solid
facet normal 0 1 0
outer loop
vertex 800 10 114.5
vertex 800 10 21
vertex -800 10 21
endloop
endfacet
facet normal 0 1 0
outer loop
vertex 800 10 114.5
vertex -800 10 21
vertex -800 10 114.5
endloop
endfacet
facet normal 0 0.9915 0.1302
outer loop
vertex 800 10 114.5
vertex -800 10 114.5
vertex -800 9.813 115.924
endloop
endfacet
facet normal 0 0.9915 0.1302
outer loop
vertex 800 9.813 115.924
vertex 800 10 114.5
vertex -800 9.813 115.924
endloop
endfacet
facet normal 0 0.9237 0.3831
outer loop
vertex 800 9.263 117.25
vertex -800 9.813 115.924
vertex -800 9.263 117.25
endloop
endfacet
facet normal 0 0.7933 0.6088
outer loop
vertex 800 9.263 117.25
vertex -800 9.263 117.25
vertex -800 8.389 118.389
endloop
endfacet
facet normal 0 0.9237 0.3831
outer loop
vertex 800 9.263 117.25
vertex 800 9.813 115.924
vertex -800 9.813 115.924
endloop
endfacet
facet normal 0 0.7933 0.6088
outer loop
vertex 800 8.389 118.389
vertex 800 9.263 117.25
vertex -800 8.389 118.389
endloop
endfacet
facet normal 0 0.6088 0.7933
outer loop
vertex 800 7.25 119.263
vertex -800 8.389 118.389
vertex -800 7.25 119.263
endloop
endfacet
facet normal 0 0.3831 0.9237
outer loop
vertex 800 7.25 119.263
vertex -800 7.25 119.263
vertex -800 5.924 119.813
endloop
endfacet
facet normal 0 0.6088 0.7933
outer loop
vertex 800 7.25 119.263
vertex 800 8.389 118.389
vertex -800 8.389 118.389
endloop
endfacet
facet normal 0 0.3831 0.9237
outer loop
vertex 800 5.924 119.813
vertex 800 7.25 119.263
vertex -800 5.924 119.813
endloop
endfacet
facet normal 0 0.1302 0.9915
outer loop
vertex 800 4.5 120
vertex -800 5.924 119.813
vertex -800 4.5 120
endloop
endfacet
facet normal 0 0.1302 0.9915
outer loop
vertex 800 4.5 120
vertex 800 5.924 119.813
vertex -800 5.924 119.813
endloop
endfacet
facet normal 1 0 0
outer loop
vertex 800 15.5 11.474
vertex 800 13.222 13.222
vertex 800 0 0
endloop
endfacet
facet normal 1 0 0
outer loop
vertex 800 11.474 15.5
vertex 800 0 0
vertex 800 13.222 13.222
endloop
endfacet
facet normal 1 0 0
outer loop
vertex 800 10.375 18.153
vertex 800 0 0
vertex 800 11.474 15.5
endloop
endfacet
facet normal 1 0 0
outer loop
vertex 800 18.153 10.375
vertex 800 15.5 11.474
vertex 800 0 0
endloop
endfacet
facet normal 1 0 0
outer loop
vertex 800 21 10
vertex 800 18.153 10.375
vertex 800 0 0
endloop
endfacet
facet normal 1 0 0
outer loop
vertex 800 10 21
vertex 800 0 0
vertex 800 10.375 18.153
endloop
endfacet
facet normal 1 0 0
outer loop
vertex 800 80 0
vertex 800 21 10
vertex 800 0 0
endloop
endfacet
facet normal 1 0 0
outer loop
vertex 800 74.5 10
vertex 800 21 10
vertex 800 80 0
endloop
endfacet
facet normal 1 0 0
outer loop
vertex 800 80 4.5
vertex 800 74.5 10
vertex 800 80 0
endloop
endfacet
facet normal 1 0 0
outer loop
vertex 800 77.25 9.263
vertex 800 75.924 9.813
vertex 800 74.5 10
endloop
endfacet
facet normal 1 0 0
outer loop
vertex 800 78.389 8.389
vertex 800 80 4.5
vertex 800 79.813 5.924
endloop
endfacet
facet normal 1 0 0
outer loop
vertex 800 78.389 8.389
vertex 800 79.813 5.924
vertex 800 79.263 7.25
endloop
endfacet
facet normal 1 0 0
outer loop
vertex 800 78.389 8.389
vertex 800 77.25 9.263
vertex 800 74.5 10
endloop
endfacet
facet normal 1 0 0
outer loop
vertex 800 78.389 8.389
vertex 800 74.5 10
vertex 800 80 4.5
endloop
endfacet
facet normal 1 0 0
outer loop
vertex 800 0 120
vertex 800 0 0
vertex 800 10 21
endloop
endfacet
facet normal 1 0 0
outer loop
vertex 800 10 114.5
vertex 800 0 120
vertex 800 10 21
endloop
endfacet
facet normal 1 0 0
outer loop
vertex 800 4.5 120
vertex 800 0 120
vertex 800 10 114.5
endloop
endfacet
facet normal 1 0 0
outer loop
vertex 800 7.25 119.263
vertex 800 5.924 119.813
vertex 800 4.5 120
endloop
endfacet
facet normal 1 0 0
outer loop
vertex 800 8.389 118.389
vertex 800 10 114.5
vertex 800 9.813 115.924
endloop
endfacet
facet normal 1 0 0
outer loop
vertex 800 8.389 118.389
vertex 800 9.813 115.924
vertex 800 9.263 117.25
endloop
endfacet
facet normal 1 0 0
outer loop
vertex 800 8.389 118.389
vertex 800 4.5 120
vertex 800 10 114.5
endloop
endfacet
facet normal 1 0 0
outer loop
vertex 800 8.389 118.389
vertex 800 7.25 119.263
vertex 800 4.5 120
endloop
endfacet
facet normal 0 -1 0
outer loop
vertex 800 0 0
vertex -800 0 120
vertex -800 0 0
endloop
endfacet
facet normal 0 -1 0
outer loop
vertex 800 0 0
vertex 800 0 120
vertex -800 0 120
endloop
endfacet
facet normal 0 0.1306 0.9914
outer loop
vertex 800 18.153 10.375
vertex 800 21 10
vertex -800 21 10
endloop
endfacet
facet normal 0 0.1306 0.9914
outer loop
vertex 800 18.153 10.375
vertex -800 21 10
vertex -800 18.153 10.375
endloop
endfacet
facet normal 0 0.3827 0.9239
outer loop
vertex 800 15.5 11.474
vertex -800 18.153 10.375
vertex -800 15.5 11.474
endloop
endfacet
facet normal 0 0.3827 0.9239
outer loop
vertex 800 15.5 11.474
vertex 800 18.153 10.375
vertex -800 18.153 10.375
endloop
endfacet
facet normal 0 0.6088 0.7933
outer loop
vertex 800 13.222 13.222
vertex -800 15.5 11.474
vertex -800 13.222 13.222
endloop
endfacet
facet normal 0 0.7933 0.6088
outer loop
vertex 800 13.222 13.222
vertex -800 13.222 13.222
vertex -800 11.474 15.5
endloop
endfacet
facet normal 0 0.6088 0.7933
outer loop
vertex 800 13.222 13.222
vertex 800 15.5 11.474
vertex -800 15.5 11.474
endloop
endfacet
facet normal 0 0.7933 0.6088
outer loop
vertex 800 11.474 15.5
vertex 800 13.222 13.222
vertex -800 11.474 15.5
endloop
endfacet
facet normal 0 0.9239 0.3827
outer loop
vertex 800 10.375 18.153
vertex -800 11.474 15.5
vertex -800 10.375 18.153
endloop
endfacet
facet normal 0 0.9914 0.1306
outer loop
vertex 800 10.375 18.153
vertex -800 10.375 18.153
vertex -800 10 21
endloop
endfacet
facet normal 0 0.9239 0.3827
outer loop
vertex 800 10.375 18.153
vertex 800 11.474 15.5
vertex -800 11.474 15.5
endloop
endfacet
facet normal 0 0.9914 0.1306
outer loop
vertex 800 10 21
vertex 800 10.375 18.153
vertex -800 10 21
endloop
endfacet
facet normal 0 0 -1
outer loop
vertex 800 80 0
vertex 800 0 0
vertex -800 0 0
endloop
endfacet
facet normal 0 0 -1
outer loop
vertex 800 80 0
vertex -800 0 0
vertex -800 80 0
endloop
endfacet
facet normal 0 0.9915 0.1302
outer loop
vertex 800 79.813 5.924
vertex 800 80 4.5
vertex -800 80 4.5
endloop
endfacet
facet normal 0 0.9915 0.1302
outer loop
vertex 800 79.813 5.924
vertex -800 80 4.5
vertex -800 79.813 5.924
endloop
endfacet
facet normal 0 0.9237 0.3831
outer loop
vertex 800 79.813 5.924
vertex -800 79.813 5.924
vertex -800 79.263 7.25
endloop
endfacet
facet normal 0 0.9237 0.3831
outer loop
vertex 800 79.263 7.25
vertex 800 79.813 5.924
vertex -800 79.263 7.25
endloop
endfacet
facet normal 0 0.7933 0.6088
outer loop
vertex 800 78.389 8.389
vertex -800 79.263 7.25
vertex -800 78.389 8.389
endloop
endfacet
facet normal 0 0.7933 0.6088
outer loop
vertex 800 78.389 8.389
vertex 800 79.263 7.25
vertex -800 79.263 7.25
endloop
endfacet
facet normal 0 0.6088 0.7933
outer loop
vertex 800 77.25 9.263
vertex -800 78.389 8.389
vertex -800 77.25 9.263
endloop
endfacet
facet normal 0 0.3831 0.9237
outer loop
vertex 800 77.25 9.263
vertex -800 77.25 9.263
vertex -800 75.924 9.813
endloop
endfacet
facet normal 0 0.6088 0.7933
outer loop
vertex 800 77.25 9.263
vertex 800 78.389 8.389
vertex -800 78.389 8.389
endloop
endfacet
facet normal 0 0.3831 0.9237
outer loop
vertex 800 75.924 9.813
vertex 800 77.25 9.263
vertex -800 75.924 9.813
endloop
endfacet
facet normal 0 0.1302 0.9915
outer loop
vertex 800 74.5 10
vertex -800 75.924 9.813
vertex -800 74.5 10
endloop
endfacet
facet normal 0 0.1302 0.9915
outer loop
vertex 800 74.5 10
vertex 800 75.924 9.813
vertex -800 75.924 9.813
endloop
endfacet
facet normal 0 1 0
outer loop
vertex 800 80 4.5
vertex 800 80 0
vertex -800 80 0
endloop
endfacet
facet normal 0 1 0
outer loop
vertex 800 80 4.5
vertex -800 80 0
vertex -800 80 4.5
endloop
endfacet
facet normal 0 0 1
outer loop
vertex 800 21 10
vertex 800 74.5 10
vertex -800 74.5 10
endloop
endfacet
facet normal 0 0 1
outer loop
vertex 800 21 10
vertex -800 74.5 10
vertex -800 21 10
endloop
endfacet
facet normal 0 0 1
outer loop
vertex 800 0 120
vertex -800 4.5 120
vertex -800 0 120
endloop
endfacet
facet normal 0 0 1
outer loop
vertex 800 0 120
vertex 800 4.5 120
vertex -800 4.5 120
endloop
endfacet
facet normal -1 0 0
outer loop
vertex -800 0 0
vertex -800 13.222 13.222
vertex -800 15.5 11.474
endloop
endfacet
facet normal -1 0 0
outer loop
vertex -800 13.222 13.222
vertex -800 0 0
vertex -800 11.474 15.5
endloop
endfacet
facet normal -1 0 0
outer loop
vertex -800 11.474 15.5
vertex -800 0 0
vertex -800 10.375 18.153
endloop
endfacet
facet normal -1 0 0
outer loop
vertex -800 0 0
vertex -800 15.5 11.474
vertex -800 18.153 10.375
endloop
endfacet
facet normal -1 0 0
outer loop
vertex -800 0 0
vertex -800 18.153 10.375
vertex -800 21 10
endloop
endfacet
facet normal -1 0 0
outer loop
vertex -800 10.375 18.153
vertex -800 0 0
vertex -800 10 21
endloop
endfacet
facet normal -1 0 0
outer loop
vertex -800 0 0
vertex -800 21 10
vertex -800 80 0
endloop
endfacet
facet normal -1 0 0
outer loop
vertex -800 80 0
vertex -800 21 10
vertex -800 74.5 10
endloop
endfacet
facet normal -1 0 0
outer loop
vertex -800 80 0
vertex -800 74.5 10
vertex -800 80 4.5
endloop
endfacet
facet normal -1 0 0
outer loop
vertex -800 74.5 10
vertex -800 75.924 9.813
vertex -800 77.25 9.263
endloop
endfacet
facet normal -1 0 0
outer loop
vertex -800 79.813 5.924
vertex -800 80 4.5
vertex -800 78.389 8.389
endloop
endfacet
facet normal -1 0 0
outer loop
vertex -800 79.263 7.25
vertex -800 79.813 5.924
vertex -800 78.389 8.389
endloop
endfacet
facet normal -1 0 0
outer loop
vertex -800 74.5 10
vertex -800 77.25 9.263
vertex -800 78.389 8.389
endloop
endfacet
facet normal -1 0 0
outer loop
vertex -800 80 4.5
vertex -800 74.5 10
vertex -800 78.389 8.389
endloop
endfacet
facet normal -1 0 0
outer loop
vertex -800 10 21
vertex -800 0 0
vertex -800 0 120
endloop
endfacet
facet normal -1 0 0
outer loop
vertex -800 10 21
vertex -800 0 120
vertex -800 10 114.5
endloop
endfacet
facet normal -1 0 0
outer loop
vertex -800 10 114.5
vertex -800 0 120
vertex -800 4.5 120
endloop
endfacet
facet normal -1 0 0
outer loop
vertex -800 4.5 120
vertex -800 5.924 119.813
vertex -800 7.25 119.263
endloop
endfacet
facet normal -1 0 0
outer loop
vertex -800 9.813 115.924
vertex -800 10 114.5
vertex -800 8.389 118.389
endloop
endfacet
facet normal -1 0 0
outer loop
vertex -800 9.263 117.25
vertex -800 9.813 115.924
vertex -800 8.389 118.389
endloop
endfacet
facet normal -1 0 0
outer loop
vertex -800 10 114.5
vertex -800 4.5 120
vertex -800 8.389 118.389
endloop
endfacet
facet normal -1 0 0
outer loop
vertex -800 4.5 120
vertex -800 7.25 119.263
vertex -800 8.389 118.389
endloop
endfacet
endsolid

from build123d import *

# Parameters (mm, degrees)
F1_DEPTH = 800


with BuildPart() as f1:
    # F0 (on Right) → F1 (new body, symmetric)
    with BuildSketch(Plane.YZ):
        with BuildLine():
            Line((0, 120), (0, 0))
            Line((0, 0), (80, 0))
            Line((80, 0), (80, 4.5))
            ThreePointArc((80, 4.5), (78.389087, 8.389087), (74.5, 10))
            Line((74.5, 10), (21, 10))
            ThreePointArc((21, 10), (13.221825, 13.221825), (10, 21))
            Line((10, 21), (10, 114.5))
            ThreePointArc((10, 114.5), (8.389087, 118.389087), (4.5, 120))
            Line((4.5, 120), (0, 120))
        make_face()
    extrude(amount=F1_DEPTH, both=True)


solid = f1.part
